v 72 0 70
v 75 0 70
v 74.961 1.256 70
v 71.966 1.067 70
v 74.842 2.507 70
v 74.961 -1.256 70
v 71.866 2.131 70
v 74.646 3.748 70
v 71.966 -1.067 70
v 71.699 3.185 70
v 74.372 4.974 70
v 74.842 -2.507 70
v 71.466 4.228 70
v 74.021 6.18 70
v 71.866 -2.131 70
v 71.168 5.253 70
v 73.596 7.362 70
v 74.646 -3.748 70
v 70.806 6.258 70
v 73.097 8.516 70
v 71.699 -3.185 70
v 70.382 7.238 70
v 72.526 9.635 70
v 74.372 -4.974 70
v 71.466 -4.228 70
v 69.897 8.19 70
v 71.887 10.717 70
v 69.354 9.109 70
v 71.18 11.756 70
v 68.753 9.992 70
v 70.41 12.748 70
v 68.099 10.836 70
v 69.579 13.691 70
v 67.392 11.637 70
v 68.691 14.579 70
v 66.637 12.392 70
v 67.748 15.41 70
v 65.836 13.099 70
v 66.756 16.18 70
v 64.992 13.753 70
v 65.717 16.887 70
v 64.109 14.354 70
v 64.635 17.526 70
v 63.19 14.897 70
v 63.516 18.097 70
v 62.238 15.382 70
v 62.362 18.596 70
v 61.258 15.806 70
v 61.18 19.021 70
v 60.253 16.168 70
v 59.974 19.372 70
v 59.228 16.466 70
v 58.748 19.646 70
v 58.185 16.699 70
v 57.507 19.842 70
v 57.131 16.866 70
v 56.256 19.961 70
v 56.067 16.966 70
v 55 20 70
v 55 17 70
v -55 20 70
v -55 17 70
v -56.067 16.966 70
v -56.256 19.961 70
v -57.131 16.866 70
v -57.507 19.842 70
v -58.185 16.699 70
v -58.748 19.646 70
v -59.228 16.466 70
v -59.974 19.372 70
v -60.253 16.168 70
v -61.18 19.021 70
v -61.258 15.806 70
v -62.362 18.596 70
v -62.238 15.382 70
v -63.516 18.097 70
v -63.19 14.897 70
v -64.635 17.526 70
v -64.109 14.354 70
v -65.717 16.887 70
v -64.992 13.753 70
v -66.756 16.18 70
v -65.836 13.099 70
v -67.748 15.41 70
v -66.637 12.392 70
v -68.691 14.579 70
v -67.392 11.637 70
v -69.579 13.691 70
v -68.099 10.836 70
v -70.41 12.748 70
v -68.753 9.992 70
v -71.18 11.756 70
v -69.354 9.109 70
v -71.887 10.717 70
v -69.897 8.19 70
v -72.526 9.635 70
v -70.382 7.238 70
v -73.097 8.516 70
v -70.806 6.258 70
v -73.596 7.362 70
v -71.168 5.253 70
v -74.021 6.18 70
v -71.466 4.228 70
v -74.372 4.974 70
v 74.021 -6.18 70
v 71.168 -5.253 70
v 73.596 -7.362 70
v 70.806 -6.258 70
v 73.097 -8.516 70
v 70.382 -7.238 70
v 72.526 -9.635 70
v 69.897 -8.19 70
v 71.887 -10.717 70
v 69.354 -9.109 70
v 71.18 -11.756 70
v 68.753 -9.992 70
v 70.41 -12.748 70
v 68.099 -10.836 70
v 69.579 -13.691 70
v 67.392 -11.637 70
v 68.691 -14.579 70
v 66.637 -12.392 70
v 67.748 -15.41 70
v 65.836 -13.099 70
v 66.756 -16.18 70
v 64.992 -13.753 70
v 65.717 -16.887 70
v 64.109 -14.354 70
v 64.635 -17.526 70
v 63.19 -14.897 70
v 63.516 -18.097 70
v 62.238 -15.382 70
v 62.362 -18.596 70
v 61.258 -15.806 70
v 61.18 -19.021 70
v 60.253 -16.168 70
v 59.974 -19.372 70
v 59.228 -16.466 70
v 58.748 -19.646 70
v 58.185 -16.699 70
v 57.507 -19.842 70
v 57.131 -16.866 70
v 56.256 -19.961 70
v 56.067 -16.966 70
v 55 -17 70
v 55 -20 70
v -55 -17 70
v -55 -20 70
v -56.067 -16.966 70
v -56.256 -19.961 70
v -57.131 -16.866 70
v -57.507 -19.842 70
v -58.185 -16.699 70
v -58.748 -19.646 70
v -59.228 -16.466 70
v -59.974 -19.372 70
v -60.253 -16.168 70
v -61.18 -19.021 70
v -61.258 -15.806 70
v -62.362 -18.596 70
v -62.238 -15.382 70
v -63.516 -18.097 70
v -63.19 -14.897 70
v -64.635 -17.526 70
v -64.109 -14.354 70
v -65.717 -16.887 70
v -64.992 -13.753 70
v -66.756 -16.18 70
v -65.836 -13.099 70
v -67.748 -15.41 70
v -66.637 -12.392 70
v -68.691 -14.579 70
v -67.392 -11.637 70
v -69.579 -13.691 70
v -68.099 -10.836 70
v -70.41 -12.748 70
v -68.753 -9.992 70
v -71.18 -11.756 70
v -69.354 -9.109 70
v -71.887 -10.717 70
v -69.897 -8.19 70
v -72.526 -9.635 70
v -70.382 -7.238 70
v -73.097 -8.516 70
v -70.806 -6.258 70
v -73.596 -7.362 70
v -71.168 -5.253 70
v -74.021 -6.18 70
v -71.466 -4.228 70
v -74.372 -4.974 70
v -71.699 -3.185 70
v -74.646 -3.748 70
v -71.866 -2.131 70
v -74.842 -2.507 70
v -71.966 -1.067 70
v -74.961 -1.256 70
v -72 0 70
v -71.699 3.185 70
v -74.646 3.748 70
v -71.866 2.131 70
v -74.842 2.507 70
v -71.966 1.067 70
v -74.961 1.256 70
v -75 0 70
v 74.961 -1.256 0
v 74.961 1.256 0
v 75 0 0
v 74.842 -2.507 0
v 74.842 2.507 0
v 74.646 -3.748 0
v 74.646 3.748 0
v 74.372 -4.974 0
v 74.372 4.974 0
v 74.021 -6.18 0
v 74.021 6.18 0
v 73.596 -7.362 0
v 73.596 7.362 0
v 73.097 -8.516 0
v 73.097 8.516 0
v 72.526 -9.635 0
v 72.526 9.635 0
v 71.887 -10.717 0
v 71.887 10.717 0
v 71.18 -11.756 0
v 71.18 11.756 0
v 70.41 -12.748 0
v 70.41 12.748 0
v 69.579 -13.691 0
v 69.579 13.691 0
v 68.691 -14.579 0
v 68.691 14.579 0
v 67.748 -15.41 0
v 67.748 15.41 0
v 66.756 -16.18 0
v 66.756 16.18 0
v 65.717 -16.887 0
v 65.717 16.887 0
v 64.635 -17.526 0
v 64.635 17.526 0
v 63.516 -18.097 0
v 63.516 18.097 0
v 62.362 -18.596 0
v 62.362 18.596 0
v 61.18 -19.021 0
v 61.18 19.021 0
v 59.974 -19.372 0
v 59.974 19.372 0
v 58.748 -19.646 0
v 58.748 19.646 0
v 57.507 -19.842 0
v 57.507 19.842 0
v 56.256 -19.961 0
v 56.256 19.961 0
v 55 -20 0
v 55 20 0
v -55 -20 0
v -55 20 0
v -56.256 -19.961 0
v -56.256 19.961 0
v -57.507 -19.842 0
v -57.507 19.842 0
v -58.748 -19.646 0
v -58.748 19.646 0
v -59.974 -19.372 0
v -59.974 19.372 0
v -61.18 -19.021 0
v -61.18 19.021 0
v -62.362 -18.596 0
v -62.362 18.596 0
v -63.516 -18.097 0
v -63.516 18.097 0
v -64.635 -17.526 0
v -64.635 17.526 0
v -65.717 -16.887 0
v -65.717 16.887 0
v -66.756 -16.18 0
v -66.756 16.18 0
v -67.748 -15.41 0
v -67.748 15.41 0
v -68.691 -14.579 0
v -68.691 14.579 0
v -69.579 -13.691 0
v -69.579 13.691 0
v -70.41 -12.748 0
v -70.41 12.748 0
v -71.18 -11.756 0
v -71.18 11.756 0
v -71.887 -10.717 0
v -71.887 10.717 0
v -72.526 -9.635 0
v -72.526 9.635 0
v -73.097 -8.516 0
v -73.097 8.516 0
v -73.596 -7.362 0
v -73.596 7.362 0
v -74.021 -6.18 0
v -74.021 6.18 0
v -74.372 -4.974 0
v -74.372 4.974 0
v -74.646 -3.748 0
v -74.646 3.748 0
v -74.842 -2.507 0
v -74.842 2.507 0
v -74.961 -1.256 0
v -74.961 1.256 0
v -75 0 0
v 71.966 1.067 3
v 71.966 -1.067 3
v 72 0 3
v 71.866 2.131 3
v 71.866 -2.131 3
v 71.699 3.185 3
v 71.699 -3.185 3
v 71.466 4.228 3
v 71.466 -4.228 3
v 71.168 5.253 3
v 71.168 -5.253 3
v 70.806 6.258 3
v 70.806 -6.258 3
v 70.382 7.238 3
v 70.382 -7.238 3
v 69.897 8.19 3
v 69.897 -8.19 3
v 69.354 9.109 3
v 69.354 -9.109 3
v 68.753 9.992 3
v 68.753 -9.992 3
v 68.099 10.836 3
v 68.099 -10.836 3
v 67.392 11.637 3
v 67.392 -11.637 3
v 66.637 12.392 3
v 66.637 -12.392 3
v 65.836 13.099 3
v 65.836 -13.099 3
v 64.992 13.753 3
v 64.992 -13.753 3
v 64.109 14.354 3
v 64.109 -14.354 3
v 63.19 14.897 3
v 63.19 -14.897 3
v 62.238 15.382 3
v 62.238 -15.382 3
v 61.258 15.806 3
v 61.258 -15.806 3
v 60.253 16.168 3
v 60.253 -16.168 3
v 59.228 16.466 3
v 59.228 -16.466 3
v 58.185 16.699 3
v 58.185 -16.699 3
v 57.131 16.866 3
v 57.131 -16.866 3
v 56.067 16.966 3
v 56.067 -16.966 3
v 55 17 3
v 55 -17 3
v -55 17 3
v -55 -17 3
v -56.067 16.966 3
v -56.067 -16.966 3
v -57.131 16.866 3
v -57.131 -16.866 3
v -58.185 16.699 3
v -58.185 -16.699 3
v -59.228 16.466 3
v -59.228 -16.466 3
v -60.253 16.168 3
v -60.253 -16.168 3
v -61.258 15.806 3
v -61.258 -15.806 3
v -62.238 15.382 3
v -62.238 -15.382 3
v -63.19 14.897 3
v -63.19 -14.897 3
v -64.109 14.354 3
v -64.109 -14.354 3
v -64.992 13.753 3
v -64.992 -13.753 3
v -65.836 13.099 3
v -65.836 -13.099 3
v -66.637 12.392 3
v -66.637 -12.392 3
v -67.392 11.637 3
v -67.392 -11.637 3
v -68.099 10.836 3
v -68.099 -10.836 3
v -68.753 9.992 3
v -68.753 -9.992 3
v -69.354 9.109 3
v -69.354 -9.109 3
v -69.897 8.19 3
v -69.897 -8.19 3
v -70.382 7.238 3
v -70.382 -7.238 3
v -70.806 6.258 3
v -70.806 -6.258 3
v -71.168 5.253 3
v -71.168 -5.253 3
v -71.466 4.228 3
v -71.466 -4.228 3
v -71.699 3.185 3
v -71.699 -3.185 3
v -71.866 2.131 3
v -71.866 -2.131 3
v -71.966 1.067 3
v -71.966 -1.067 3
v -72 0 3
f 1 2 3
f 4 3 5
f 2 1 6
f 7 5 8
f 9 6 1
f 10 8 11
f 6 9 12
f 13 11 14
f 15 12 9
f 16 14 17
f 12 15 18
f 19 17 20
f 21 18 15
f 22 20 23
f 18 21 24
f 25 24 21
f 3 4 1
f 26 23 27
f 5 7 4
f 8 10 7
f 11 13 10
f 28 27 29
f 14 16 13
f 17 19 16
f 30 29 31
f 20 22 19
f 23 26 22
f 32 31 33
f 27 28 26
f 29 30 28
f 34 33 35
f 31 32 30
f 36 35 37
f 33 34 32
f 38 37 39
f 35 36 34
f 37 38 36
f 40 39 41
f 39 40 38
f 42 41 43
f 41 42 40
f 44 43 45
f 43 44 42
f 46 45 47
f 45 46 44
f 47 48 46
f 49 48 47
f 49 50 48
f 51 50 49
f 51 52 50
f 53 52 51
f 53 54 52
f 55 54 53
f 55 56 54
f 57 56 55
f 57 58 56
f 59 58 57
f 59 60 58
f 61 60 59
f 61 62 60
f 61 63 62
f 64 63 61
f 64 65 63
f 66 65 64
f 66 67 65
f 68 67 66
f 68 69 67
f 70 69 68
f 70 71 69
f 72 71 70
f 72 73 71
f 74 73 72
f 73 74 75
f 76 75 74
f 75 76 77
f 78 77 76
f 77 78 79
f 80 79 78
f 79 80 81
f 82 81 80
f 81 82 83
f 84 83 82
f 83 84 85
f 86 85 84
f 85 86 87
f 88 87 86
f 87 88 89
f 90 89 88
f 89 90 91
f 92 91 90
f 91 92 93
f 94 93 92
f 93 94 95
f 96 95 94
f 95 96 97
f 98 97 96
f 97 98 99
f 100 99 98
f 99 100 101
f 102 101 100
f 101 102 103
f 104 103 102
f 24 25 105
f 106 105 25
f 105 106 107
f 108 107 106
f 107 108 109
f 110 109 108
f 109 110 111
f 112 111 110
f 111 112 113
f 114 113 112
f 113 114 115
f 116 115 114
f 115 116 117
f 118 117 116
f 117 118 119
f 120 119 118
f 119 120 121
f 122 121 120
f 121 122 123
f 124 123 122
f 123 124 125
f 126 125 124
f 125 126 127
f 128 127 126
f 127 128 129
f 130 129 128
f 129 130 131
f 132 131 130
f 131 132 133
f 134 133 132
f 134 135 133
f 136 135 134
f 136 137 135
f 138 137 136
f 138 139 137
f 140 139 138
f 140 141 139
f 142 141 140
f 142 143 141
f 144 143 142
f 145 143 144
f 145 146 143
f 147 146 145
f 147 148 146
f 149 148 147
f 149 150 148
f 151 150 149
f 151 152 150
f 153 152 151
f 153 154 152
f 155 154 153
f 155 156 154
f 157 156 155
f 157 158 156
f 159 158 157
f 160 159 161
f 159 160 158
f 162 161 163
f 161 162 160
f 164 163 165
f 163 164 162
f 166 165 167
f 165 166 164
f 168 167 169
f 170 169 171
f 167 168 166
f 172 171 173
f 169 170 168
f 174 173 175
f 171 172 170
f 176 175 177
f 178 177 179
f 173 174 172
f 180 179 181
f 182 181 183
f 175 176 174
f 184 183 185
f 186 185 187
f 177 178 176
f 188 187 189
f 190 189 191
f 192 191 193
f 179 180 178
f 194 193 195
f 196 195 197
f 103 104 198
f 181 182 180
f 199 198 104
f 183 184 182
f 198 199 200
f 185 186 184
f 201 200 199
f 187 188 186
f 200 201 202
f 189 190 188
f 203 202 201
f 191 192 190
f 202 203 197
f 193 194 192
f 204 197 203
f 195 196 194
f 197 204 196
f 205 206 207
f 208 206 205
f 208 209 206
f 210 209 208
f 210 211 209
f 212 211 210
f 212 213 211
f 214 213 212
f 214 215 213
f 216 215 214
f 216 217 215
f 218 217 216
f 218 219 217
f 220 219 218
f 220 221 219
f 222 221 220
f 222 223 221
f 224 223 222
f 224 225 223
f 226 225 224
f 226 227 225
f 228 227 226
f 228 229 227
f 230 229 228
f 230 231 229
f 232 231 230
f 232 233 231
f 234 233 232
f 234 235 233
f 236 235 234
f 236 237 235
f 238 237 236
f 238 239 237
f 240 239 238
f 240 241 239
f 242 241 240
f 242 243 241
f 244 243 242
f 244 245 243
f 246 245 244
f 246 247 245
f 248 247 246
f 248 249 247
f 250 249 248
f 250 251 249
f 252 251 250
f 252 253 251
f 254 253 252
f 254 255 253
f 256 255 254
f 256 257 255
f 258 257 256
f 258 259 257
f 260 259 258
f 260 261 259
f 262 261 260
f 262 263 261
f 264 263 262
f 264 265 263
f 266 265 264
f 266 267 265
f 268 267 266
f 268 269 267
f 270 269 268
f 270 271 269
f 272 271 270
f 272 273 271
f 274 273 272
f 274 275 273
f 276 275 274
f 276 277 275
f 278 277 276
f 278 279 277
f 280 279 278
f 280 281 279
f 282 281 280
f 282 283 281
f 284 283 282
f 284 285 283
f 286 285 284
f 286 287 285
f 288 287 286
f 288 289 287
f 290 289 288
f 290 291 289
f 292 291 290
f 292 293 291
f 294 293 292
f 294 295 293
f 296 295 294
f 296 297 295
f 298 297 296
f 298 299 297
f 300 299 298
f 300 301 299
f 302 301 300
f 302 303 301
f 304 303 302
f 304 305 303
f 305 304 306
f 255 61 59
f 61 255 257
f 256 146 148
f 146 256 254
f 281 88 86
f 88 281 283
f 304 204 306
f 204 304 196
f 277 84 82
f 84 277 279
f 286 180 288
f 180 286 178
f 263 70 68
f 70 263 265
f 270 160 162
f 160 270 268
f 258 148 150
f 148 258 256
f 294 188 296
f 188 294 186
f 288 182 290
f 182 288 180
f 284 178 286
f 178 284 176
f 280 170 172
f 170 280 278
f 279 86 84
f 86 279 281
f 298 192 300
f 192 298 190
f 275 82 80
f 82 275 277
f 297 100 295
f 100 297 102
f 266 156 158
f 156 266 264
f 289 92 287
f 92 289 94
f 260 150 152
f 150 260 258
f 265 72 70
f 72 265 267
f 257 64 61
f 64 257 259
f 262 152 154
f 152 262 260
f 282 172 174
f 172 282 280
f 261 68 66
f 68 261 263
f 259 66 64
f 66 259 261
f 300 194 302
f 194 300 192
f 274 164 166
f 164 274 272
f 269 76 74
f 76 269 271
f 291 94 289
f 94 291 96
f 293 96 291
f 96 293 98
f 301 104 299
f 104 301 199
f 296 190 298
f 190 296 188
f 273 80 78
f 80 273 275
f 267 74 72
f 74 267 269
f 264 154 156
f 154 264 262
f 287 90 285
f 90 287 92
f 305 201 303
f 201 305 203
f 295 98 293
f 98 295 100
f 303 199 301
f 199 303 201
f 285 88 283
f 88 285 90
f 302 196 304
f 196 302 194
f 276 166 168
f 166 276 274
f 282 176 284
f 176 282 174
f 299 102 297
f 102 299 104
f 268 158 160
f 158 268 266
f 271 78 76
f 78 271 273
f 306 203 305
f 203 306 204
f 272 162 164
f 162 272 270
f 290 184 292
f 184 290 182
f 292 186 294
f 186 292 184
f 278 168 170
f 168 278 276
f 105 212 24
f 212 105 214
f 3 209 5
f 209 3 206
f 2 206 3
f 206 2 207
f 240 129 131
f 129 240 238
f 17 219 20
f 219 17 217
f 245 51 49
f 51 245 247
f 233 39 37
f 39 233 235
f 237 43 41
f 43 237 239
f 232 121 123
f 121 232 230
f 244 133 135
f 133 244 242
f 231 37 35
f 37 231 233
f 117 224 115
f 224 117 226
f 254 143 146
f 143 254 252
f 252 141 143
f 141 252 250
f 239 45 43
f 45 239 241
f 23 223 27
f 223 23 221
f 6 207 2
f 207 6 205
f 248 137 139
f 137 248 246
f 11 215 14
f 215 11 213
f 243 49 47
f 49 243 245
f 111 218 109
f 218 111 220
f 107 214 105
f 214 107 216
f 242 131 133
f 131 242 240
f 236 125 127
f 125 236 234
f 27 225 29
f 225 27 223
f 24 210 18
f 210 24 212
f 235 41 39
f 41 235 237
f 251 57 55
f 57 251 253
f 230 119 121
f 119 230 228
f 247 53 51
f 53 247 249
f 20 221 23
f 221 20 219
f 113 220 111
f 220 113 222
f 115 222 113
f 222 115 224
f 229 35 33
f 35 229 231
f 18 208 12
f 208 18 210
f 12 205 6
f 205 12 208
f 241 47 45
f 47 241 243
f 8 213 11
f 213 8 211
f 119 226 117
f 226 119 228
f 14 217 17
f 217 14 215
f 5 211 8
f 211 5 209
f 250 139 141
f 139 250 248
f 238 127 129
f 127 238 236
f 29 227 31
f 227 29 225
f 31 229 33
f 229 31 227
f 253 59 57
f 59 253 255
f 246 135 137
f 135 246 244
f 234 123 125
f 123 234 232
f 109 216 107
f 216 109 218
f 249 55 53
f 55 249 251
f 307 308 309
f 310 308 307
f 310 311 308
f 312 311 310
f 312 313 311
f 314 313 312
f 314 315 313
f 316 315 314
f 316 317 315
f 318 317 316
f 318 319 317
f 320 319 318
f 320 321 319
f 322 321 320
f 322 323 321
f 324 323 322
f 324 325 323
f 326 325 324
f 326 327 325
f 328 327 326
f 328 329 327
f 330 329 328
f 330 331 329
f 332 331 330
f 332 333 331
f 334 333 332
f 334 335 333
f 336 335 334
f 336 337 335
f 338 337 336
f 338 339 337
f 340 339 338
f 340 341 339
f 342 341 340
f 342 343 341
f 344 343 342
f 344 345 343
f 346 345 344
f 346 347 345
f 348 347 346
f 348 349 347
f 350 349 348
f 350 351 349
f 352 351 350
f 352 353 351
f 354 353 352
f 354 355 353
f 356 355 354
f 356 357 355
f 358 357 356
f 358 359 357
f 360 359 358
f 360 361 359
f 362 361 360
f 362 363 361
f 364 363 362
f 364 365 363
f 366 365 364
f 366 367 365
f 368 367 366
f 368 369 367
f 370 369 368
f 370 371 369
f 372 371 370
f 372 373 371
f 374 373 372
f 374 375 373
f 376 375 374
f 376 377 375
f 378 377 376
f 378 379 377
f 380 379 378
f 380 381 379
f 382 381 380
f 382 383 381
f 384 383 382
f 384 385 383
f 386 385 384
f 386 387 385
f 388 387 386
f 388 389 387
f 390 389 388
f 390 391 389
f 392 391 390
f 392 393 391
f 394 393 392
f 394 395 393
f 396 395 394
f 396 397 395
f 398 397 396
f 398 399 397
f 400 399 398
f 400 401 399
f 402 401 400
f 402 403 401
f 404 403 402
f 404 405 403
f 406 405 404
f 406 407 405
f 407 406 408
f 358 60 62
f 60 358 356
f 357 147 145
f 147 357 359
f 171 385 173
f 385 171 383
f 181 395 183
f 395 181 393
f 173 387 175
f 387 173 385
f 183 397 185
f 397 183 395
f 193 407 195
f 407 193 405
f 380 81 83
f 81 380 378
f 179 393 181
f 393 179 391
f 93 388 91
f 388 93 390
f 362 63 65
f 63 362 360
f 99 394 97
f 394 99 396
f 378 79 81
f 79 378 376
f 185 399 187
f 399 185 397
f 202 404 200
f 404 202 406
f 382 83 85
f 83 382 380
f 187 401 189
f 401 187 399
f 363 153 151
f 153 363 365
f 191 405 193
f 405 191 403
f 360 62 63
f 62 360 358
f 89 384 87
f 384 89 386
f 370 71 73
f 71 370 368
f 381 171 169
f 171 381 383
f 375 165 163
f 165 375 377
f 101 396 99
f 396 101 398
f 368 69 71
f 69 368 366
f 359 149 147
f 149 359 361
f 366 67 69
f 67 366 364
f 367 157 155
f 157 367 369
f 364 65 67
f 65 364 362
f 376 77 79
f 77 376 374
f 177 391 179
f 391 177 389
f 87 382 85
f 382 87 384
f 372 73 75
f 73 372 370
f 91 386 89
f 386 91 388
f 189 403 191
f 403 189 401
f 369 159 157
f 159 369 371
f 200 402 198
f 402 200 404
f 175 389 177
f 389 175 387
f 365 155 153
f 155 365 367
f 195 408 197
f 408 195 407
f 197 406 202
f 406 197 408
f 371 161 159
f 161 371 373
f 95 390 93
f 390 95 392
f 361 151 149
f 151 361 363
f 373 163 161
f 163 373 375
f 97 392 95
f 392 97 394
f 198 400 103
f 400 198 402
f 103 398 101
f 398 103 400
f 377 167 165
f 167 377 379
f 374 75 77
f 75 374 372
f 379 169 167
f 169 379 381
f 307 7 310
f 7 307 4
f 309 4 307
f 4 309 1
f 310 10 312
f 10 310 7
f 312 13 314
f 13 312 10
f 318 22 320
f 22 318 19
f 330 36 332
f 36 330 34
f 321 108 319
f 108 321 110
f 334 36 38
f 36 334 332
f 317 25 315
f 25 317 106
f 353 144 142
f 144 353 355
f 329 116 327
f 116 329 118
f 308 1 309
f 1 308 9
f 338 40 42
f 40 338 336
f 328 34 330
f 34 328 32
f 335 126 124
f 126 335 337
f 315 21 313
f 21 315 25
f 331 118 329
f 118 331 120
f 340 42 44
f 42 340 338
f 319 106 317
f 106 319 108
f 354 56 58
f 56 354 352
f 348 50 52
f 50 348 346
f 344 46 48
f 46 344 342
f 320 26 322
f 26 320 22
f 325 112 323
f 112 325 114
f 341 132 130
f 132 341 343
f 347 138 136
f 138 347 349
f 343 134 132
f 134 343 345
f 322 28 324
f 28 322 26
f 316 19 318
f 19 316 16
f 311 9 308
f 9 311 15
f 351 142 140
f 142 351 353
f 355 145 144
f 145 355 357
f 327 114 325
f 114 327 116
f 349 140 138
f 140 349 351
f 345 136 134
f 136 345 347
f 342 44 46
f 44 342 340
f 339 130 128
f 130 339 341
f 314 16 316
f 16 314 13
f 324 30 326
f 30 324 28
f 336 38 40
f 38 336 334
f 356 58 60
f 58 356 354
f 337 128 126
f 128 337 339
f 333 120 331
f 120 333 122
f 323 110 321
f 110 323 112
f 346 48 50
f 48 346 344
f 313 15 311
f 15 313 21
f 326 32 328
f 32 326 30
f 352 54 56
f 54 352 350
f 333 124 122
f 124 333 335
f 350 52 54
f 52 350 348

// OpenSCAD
//Length
L=150;
//Depth
D=40;
//Height
H=70;
//Thickness
t=3;

vase(L=L,D=D,H=H,t=t);

module langloch(L=150,D=40,H=70)
{
  translate(v=[0,0,H/2]) {
    cube(size=[L-D,D,H],center=true);
  }
  translate(v=[-L/2+D/2,0,0]) {
    cylinder(h=H,r=D/2,$fn=100);
  }
  translate(v=[L/2-D/2,0,0]) {
    cylinder(h=H,r=D/2,$fn=100);
  }
}

module vase(L=150,D=40,H=70,t=3)
{
  difference() {
    langloch(L=L,D=D,H=H);
    translate(v=[0,0,t]) {
      langloch(L=L-t-t,D=D-t-t,H=H);
    }
  }
}

// -- (c) 2013 Abdreas Urben (urbenan) 
// -- GPL license
